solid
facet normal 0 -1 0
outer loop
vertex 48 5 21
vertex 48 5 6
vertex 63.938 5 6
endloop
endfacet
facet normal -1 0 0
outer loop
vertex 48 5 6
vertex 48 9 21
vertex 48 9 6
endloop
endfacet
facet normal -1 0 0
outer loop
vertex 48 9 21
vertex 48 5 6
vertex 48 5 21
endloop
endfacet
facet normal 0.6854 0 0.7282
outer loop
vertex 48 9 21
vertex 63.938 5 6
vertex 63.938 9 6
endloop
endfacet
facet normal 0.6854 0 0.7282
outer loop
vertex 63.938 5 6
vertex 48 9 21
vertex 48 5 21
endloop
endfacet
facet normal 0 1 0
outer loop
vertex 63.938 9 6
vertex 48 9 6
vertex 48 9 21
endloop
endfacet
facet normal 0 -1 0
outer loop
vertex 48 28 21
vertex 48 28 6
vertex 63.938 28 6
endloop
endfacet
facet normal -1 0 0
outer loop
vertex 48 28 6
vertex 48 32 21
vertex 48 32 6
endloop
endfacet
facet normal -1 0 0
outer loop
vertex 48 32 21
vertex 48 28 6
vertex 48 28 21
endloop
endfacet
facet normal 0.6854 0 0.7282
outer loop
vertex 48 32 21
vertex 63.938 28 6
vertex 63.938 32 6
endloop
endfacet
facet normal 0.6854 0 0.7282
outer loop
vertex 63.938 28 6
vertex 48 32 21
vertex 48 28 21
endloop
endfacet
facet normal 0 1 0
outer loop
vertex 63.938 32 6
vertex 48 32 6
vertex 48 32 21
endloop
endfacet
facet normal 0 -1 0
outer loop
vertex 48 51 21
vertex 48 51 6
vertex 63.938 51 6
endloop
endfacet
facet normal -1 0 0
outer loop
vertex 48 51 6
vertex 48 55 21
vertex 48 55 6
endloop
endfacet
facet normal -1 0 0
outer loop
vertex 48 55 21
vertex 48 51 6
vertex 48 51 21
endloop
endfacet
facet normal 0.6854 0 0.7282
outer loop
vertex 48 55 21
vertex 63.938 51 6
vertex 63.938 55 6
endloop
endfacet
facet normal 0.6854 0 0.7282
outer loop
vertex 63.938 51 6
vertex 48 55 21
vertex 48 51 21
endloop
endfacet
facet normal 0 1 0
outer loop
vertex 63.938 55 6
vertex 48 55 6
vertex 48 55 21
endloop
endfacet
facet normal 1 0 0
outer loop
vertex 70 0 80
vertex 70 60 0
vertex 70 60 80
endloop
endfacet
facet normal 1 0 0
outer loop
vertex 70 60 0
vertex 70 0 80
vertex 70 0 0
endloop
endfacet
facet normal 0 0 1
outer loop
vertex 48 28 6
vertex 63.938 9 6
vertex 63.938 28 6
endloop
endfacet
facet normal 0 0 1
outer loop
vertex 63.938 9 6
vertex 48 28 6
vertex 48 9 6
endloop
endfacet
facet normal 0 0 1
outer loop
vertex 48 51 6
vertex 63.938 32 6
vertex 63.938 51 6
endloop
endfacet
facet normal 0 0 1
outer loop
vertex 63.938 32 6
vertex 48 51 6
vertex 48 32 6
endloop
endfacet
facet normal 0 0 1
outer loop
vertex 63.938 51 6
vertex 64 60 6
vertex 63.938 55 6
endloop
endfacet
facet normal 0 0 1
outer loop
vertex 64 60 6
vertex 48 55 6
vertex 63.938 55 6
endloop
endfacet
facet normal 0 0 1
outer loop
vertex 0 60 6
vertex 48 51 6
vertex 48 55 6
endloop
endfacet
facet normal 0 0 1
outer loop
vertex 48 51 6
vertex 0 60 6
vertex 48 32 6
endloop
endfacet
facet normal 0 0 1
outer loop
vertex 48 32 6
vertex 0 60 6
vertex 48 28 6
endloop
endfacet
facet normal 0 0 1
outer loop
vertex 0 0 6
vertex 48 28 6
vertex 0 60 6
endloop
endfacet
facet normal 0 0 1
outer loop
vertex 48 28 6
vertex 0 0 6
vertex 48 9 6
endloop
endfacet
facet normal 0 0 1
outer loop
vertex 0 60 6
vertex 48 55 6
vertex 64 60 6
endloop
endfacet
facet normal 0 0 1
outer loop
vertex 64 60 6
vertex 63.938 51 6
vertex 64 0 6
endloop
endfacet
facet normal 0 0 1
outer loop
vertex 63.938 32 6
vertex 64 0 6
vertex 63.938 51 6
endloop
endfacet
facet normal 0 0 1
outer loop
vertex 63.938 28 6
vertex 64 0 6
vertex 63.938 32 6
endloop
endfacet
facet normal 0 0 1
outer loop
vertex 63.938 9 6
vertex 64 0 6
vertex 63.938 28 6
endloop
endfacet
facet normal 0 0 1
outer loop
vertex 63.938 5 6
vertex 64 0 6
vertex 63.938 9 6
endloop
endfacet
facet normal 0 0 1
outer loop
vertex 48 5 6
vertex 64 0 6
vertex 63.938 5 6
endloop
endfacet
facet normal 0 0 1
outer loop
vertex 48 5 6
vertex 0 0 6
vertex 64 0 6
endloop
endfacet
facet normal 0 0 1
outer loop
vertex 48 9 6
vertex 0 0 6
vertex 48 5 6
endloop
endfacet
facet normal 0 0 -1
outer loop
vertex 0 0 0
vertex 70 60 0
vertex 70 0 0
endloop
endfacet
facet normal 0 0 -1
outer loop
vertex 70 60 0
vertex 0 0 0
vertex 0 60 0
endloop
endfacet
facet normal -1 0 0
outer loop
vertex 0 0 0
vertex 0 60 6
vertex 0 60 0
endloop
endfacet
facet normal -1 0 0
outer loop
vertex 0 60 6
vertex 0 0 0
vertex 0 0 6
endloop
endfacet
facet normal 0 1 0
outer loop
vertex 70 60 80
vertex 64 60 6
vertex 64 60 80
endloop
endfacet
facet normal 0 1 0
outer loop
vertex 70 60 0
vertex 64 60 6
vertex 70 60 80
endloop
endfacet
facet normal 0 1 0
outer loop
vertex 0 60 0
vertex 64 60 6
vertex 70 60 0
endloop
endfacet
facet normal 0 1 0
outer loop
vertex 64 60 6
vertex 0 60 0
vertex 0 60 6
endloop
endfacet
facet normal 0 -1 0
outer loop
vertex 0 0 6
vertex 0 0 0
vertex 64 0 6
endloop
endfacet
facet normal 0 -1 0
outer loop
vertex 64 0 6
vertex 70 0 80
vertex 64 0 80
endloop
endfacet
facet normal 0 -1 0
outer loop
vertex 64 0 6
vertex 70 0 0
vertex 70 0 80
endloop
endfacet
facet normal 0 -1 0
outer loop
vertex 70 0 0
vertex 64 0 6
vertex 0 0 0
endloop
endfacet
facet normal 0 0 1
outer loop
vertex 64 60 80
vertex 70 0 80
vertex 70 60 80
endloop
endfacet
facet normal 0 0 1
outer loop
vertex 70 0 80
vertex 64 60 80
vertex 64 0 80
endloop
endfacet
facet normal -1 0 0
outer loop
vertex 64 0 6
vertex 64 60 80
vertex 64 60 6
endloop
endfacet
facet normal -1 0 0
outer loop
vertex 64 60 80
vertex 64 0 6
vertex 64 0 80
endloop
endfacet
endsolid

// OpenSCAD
$fn = 32;

// ----------------------------------------------------------------------
// Rib bracket: 3-gusset L bracket
// ----------------------------------------------------------------------

// --- parameters (mm) ---
base_l = 70;              // foot length, X
base_w = 60;              // foot width, Y
base_t = 6;               // foot thickness
plate_t = 6;              // upright plate thickness
plate_h = 80;             // overall height
gus_l = 16;               // gusset leg along the foot
gus_h = 16;               // gusset height
gus_t = 4;                // gusset thickness
gus_edge = 5;             // gusset margin from the foot edge
n_gus = 3;                // gusset count
fit_tol = 0.1;            // tolerance for press fits, mm
free_tol = 0.5;           // tolerance for clearance fits, mm

gus_pitch = (base_w - 2 * gus_edge - gus_t) / (n_gus - 1);  // gusset pitch

union() {
  cube([base_l, base_w, base_t]);
  translate([base_l - plate_t, 0, base_t - 1])
    cube([plate_t, base_w, plate_h - base_t + 1]);
  for (i = [0 : n_gus - 1])
    translate([base_l - plate_t - gus_l, gus_edge + i * gus_pitch, base_t - 1])
      rotate([-90, 0, 0])
        linear_extrude(height = gus_t)
          polygon(points = [[0, 0], [gus_l + 1, 0], [0, -gus_h]]);
}
